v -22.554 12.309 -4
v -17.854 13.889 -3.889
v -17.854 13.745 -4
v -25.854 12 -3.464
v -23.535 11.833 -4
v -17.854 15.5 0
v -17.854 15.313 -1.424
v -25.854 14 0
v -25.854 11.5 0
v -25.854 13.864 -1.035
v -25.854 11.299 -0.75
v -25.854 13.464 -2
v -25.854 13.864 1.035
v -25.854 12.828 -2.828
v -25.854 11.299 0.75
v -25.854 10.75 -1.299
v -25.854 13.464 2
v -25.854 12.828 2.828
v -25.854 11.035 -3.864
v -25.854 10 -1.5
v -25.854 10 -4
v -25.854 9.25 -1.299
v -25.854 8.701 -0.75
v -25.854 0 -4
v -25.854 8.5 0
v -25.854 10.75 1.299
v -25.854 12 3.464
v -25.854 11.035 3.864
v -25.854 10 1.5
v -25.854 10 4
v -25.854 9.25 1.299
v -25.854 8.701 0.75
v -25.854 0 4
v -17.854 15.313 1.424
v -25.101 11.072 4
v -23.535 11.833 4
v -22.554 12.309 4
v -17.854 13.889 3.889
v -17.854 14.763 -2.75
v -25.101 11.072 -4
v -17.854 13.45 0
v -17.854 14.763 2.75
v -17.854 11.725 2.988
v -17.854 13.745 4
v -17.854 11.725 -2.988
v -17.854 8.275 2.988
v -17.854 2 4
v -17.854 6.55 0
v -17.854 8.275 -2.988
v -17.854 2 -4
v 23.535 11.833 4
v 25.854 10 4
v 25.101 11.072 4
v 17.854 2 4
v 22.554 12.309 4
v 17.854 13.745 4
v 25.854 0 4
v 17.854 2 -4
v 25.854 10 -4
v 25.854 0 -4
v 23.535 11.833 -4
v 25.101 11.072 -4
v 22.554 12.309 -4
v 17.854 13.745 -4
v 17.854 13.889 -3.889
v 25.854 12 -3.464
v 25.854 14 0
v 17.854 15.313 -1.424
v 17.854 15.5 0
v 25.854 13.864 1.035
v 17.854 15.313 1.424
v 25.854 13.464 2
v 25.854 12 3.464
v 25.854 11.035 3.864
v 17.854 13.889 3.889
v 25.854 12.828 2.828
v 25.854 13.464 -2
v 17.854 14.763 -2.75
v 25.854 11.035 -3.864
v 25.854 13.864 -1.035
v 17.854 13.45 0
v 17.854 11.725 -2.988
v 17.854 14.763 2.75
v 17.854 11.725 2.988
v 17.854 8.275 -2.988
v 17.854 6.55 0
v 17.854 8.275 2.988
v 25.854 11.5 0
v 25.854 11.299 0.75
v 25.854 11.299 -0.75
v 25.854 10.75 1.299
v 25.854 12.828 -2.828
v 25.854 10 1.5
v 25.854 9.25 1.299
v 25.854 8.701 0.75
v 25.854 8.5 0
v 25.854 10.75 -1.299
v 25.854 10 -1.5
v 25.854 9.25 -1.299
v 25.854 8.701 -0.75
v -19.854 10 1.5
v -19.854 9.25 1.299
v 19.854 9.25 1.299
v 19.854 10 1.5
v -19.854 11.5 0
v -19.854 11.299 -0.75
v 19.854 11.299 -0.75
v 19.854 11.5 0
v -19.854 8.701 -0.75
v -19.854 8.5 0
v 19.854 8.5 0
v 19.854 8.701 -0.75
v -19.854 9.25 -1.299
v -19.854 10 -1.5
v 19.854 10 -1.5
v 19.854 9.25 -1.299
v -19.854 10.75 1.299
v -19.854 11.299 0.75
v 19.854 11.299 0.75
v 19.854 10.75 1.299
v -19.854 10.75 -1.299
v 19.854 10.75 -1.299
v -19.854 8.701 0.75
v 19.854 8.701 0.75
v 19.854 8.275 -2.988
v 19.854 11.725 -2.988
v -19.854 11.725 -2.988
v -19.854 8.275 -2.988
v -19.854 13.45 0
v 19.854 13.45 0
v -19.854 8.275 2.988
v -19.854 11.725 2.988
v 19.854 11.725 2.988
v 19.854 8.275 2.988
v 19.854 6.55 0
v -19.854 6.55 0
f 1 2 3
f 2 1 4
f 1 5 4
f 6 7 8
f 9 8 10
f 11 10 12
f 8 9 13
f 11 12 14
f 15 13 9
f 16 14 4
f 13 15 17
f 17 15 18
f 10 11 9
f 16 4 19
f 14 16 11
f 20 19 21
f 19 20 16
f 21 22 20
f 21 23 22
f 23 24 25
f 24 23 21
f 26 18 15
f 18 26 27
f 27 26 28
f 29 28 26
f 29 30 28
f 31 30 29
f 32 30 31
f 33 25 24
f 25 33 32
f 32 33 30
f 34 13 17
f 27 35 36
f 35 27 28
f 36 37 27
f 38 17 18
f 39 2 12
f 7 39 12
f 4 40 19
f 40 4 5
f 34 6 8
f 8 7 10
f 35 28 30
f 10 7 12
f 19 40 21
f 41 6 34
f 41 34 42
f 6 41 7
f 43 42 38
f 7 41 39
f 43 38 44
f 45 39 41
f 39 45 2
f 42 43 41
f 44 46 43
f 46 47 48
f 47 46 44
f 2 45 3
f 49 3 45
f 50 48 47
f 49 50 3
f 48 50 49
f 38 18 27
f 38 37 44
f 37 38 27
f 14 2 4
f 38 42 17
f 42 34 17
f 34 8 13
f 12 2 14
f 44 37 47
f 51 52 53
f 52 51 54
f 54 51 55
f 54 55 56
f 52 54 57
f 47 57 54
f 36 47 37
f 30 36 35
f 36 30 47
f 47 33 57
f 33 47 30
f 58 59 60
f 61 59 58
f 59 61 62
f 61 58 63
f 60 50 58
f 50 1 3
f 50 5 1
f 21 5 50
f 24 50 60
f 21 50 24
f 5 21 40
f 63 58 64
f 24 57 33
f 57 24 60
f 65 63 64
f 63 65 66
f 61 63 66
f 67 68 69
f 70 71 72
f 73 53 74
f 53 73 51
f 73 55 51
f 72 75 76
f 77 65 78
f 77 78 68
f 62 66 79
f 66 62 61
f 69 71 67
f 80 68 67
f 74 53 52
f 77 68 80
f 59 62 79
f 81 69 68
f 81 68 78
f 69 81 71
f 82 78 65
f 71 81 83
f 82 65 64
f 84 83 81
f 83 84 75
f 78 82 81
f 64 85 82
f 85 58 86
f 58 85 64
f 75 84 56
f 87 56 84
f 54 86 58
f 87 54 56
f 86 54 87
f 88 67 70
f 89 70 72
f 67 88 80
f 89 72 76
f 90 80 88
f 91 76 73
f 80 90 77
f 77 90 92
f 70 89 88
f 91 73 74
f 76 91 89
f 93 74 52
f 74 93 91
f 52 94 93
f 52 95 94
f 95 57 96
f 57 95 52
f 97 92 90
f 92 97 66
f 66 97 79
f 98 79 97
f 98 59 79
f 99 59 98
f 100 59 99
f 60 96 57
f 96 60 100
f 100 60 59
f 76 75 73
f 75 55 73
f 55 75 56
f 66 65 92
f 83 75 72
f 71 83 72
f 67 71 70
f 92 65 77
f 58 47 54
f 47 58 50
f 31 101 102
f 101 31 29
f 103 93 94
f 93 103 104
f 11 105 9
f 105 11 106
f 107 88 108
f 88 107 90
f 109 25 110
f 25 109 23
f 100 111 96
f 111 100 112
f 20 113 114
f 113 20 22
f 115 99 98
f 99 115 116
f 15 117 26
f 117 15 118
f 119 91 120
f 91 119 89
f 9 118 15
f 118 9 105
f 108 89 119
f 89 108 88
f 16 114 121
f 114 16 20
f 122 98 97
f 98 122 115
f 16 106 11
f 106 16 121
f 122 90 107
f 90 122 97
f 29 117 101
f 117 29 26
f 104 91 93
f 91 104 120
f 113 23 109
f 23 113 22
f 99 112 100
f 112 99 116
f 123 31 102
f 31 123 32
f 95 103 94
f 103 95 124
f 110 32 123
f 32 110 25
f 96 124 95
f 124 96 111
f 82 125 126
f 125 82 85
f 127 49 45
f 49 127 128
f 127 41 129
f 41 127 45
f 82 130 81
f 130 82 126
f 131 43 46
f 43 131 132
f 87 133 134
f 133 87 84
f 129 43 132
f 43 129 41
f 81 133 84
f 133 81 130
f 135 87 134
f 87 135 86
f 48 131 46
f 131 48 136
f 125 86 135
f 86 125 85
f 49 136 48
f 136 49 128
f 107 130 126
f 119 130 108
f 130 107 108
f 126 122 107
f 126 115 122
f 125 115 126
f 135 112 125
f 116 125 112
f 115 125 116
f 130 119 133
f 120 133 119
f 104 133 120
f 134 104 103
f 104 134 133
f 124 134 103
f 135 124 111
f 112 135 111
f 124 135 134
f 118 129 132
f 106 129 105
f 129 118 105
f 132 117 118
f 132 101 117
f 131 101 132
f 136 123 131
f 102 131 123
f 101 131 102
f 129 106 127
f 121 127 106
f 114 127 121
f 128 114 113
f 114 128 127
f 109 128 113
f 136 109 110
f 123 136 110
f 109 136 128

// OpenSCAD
// file: configuration.scad
// Increase this if your slicer or printer make holes too tight.
extra_radius = 0.2;

// OD = outside diameter, corner to corner.
m3_nut_od = 6.1;
m3_nut_radius = m3_nut_od/2 + 0.2 + extra_radius;

// Major diameter of metric 3mm thread.
m3_major = 2.85;
m3_radius = m3_major/2 + extra_radius;
m3_wide_radius = m3_major/2 + 0.2 + extra_radius;

// NEMA17 stepper motors.
motor_shaft_diameter = 5;
motor_shaft_radius = motor_shaft_diameter/2 + extra_radius;

// Frame brackets.
thickness = 3.6;
// main file
include <configuration.scad>;

ratio= 1.39;
separation = 37.2*ratio;
radius = 33*ratio;
height = 8;
cone_r1 = height/2;
cone_r2 = 5.5;

echo("Separation= ", separation);

module arm_mount_raw() {
	difference() {
		union() {
	   		translate([-separation/2,-10,-height/2]) cube([separation, 2, height]);		
			intersection() {
		   		cube([separation, 20, height], center=true);
			    union() {
		          for (s = [-1, 1]) scale([s, 1, 1]) {
		            translate([separation/2-4, 0, 0]) rotate([0, 90, 0])
		              cylinder(r1=cone_r2, r2=cone_r1, h=8, center=true, $fn=24);
		            translate([separation/2-4, -5, 0])
		              cube([8, 10, height], center=true);
		          }
				}
			}
	  }
	  rotate([0, 90, 0])
	      cylinder(r=1.5, h=separation+1, center=true, $fn=12);
	  rotate([90, 0, 90])
	      cylinder(r=m3_nut_radius, h=separation-12, center=true, $fn=6);
	}
}

module arm_mount() {
	translate([0,10,0]) arm_mount_raw();
}

arm_mount();
